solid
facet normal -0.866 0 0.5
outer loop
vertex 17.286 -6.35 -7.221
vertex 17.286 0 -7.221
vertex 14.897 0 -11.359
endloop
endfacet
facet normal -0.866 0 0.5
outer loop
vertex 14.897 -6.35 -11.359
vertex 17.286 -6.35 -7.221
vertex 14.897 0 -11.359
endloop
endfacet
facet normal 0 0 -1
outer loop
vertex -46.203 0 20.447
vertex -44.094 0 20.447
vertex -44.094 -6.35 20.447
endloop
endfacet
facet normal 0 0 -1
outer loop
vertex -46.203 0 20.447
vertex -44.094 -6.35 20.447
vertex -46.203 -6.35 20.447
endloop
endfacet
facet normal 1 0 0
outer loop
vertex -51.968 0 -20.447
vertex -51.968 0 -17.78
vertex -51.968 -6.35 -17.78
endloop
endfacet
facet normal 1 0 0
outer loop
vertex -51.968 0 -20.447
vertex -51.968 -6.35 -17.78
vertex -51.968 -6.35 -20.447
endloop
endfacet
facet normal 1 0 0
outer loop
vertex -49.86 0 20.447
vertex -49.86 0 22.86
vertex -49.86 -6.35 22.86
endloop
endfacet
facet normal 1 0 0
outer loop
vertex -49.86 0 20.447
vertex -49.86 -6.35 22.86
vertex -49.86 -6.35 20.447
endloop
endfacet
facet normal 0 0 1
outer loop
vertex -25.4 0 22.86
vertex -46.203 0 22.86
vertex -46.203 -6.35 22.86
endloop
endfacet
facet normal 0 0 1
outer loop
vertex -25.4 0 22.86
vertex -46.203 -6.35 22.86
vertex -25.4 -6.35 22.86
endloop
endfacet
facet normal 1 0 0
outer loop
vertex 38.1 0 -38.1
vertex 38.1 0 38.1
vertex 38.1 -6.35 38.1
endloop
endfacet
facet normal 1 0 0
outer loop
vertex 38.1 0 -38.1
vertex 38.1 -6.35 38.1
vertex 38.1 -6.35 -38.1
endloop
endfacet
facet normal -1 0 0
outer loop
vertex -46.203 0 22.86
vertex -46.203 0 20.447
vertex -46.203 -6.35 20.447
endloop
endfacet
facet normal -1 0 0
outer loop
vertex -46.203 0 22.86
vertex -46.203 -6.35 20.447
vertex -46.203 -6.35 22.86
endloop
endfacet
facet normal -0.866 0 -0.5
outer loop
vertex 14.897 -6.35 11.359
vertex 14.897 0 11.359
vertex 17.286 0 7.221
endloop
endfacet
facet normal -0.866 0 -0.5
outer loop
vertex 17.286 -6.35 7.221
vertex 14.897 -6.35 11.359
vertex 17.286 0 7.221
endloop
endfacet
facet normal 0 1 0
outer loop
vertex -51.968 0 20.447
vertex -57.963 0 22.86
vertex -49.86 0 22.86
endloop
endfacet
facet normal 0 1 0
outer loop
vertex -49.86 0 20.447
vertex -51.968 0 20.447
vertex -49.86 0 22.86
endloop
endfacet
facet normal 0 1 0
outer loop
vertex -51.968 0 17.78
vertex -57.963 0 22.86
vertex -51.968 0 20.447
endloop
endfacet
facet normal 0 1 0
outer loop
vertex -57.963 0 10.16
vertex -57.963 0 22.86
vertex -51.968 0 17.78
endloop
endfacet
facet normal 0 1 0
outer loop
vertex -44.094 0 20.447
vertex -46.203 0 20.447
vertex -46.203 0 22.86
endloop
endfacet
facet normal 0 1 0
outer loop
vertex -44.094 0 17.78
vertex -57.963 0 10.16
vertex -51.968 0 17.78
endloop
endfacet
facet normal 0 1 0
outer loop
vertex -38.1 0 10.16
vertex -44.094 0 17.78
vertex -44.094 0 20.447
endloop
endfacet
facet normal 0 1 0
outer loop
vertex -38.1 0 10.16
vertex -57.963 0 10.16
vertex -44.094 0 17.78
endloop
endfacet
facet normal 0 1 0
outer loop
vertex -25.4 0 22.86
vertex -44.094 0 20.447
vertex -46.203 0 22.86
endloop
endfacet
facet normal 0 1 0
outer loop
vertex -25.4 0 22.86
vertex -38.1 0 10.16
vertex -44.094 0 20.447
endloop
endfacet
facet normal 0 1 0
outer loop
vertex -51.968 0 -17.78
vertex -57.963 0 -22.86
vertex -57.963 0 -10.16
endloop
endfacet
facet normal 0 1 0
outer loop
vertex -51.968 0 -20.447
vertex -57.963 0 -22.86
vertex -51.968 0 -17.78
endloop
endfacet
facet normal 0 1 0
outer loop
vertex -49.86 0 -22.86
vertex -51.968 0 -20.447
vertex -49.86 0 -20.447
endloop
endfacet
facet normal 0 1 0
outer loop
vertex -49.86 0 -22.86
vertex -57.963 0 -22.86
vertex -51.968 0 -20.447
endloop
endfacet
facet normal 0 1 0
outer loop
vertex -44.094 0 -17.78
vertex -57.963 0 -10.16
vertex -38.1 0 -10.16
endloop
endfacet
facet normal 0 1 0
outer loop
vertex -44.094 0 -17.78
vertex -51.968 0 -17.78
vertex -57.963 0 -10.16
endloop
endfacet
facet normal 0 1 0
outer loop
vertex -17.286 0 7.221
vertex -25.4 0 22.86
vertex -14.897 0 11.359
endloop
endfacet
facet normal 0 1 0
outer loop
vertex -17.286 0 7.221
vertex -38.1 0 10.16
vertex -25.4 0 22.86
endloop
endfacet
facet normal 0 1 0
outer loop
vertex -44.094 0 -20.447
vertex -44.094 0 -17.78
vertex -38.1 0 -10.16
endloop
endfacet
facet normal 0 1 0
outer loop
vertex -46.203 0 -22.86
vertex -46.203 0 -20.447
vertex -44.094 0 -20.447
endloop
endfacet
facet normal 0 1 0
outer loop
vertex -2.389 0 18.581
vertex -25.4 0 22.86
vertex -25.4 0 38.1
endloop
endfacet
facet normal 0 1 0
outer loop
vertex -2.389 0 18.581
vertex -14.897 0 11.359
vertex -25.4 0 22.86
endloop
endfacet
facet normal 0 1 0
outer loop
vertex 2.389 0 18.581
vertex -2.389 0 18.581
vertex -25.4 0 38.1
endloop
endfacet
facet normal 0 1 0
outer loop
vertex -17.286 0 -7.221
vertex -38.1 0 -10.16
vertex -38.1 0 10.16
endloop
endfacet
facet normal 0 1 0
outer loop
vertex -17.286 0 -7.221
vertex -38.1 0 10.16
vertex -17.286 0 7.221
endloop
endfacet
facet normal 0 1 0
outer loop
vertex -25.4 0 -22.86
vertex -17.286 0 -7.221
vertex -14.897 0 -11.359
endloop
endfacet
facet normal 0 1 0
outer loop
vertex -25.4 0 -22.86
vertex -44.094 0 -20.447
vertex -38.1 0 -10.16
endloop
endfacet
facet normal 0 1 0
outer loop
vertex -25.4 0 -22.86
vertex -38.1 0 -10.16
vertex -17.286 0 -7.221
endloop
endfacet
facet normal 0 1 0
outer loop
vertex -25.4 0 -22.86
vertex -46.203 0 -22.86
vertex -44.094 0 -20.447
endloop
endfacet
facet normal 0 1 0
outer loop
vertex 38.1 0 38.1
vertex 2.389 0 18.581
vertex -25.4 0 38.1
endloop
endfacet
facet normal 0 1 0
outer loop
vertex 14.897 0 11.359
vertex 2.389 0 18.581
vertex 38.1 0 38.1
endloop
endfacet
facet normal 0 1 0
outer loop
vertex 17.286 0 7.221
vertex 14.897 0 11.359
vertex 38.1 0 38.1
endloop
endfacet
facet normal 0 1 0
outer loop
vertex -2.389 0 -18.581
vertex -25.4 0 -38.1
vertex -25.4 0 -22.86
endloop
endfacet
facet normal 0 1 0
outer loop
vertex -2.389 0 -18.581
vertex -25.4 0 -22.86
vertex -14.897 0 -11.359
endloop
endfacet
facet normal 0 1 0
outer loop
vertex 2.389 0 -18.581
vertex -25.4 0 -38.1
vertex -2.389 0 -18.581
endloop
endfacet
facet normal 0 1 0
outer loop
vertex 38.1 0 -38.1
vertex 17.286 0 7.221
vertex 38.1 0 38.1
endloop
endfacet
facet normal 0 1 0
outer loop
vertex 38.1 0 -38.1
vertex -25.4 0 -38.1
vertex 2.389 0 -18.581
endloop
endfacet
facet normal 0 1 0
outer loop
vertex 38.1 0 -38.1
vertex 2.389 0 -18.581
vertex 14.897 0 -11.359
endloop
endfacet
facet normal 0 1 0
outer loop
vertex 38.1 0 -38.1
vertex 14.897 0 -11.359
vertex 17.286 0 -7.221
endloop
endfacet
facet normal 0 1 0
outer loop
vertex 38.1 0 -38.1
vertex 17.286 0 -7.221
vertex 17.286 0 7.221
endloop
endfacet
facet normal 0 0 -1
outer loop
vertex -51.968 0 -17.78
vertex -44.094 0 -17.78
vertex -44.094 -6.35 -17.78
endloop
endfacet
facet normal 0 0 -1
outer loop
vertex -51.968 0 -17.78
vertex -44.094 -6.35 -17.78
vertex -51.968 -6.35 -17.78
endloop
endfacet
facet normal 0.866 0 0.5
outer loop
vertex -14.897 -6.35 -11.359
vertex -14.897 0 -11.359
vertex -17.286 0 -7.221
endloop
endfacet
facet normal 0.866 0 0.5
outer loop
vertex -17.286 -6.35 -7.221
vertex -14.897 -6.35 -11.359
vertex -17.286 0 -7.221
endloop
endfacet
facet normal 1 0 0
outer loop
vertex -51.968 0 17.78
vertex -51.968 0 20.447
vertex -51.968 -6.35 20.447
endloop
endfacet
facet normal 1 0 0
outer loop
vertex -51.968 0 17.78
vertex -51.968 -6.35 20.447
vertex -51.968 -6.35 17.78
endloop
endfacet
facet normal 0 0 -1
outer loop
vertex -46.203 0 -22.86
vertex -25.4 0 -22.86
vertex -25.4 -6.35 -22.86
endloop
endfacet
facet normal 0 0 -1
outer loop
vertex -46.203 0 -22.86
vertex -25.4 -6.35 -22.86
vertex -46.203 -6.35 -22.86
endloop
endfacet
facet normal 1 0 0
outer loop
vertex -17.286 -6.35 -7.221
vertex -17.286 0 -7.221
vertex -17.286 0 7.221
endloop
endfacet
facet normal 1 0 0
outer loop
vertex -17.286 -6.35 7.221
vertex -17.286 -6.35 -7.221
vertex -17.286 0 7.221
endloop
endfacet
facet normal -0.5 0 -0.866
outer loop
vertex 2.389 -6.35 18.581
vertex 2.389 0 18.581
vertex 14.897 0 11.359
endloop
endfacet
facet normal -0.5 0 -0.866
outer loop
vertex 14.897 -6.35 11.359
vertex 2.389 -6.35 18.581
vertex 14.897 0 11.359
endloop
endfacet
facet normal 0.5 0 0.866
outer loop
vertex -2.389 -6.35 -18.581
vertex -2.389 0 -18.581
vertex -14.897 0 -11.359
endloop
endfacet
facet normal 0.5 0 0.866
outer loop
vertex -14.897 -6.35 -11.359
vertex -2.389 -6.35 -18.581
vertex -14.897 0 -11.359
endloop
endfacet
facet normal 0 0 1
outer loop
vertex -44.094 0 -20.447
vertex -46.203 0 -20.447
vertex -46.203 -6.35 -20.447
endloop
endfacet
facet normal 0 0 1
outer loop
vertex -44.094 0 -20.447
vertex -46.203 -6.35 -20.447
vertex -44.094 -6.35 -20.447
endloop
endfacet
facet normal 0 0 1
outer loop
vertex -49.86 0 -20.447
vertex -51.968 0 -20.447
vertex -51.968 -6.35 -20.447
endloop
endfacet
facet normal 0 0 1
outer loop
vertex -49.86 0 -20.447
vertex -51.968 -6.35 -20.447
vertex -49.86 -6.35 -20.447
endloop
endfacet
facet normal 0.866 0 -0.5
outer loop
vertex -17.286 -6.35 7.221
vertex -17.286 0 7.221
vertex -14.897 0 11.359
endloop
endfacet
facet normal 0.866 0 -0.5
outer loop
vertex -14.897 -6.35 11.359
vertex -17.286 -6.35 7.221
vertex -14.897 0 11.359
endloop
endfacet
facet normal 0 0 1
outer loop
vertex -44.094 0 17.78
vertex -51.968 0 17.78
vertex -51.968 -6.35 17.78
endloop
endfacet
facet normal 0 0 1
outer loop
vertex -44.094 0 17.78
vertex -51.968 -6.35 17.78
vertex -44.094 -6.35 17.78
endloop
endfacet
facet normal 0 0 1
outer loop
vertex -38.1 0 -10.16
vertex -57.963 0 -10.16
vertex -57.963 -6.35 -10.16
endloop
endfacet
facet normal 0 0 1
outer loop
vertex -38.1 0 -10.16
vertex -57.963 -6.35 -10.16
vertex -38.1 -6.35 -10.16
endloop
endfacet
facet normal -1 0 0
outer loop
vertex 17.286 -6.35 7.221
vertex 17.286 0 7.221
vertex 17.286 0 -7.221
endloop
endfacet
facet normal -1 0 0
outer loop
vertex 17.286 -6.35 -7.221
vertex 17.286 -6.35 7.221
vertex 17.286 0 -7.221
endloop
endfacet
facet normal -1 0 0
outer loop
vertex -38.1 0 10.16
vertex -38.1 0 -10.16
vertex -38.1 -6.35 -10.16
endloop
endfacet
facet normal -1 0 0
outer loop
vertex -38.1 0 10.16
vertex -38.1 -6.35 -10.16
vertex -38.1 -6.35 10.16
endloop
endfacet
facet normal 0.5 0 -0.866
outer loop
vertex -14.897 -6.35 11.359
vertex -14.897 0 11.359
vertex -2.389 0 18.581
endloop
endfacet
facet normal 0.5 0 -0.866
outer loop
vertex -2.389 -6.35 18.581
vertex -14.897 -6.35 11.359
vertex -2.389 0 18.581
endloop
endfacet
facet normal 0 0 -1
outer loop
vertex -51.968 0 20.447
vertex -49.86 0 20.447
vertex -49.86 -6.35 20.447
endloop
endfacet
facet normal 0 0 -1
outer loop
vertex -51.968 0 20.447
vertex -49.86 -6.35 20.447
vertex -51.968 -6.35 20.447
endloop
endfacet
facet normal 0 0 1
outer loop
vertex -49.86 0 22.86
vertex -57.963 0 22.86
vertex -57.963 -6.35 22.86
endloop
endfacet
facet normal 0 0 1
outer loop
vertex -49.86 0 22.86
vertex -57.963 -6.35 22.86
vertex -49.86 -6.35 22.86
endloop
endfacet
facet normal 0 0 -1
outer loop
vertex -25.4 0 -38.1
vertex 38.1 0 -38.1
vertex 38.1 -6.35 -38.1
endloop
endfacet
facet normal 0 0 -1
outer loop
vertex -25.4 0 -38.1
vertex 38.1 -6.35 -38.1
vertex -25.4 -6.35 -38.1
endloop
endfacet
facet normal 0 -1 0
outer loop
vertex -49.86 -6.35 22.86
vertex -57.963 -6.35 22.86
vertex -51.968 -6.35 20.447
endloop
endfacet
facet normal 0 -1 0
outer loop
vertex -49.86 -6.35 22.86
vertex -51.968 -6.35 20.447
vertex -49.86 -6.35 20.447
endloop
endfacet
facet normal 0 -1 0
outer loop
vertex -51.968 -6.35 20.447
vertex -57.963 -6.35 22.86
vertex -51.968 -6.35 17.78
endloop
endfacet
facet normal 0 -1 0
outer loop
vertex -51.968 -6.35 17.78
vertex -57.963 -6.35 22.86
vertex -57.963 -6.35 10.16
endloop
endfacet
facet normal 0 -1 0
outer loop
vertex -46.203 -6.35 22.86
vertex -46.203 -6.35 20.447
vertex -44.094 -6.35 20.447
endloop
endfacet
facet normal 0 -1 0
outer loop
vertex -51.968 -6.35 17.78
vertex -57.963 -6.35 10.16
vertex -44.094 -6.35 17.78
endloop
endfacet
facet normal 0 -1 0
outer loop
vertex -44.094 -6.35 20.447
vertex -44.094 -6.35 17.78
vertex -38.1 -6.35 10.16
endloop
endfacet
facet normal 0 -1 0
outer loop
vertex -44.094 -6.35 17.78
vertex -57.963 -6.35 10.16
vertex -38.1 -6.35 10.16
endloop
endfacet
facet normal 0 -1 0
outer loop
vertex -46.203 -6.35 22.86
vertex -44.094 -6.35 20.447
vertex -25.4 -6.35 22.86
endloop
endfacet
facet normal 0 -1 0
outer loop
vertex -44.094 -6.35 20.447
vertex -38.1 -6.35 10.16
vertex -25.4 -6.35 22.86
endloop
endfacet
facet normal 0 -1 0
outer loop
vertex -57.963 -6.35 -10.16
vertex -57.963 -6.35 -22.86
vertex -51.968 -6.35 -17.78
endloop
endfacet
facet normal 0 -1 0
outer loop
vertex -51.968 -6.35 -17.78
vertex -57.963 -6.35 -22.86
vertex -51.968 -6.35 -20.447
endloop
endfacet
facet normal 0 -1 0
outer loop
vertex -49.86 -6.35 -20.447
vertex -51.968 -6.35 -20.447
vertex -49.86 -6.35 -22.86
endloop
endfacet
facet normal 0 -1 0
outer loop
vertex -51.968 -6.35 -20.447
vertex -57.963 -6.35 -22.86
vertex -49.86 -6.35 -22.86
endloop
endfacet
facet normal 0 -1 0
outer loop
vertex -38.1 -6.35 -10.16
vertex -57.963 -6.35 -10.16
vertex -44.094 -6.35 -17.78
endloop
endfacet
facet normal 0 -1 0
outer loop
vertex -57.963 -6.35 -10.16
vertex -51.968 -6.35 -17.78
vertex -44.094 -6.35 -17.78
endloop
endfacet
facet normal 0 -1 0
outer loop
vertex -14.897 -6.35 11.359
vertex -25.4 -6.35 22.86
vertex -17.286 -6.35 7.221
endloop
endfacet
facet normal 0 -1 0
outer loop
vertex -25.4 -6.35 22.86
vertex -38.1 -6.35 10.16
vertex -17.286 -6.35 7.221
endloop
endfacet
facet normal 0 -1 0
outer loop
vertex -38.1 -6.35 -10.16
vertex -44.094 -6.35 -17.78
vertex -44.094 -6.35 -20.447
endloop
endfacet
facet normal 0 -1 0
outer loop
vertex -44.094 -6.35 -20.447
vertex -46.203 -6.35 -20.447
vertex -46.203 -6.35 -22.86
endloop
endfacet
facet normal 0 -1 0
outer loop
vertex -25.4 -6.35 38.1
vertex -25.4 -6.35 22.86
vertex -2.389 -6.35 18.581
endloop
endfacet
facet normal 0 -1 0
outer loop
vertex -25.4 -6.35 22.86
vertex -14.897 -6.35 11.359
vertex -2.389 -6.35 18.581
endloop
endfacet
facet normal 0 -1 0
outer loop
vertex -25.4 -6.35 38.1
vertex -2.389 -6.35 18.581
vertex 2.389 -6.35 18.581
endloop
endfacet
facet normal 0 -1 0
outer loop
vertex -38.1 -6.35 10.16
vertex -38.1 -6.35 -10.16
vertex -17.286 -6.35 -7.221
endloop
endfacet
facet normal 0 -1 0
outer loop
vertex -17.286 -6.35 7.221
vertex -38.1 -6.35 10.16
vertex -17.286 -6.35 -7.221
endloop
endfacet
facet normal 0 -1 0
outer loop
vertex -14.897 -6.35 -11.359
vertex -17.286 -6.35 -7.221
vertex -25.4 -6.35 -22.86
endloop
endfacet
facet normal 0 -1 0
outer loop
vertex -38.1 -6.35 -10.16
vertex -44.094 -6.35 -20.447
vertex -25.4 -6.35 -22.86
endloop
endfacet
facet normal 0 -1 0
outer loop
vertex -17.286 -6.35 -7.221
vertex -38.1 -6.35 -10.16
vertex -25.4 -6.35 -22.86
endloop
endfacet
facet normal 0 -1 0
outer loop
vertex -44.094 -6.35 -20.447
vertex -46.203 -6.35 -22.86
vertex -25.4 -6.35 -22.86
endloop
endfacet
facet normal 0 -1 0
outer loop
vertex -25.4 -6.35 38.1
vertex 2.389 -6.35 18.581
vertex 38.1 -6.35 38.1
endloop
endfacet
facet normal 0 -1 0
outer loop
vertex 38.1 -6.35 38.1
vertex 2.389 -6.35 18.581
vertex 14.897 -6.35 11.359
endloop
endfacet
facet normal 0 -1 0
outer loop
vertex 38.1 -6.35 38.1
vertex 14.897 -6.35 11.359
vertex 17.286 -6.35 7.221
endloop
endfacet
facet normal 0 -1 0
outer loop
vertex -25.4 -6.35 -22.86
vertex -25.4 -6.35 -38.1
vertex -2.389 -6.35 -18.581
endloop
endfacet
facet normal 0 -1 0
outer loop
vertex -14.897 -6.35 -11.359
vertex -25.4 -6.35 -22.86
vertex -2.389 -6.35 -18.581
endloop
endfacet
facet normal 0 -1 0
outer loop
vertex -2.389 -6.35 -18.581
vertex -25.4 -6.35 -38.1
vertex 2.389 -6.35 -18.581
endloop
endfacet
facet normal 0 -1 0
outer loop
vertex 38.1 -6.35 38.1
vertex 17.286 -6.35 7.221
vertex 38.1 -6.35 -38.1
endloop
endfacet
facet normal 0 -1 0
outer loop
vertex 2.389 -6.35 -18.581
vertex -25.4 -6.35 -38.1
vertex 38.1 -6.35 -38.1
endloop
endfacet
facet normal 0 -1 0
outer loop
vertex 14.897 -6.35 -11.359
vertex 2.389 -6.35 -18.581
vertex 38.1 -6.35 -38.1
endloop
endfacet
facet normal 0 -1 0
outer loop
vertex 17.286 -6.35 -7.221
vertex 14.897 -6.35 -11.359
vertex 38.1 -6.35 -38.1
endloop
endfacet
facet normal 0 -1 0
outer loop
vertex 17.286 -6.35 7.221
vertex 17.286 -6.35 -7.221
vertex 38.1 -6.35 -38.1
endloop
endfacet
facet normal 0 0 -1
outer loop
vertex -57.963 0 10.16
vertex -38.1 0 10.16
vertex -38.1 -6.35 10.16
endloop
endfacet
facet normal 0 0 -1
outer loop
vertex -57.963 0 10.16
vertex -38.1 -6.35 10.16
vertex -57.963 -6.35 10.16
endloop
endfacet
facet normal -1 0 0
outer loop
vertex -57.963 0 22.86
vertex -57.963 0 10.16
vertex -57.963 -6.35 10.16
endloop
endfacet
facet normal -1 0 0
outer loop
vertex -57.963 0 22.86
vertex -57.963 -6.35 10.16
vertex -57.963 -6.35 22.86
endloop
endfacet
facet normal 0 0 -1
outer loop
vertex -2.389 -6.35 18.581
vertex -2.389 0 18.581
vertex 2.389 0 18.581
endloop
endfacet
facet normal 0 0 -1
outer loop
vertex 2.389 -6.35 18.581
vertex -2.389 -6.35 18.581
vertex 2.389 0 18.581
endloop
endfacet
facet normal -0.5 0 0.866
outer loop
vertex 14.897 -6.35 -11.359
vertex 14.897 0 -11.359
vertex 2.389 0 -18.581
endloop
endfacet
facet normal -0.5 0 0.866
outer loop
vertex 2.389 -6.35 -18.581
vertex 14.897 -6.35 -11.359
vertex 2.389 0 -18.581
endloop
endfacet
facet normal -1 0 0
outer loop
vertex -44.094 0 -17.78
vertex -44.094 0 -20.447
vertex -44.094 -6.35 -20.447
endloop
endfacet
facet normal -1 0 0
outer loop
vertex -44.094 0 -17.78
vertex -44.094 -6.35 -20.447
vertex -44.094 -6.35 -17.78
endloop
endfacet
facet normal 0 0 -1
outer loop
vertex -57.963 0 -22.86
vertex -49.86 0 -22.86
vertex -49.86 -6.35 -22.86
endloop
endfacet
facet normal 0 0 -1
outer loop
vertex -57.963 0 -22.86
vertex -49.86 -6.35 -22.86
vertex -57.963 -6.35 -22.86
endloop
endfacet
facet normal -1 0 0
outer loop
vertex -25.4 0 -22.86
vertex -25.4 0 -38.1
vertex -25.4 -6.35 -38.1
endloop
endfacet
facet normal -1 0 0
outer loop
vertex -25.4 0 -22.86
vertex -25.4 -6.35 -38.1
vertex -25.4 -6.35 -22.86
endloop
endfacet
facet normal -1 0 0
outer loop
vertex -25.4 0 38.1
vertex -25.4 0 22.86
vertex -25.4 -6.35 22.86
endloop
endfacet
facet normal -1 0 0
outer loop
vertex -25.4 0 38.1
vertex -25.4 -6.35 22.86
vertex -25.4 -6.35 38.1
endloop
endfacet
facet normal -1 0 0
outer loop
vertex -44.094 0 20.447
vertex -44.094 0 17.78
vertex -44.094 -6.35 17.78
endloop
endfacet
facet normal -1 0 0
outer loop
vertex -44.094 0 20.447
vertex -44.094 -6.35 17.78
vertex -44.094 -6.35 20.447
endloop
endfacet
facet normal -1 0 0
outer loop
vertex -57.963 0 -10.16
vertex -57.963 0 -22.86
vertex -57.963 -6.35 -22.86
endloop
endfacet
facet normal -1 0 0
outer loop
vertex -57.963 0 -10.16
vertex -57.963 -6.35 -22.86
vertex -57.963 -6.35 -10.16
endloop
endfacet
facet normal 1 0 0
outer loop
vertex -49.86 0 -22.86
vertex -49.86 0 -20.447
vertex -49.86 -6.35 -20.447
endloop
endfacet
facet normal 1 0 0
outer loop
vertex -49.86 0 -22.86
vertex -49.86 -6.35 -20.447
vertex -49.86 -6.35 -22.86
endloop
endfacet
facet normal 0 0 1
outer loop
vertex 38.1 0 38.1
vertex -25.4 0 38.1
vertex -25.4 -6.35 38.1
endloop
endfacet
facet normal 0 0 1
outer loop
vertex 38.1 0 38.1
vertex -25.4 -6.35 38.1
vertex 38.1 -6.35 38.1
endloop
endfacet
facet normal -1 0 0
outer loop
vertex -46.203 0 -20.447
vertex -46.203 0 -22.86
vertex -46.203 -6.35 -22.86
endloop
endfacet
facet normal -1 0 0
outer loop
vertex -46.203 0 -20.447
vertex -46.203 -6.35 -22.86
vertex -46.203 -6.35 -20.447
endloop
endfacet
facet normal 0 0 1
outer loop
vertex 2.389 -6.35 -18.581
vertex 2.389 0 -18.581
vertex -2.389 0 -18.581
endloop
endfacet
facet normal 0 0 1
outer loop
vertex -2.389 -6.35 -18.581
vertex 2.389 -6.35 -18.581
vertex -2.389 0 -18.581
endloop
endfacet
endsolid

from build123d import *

# Parameters (mm, degrees)
BOSS_EXTRUDE1_DEPTH = 6.35


with BuildPart() as part:
    # Sketch1 → Boss-Extrude1 (new body)
    with BuildSketch(Plane(origin=(0, 0, 0), x_dir=(1, 0, 0), z_dir=(0, 1, 0))):
        Polygon((-25.4, -38.1), (38.1, -38.1), (38.1, 38.1), (-25.4, 38.1), (-25.4, 22.86), (-38.1, 22.86), (-46.2026, 22.86), (-46.2026, 20.447), (-44.0944, 20.447), (-44.0944, 17.78), (-51.9684, 17.78), (-51.9684, 20.447), (-49.8602, 20.447), (-49.8602, 22.86), (-57.9628, 22.86), (-57.9628, 10.16), (-38.1, 10.16), (-38.1, -10.16), (-57.9628, -10.16), (-57.9628, -22.86), (-49.8602, -22.86), (-49.8602, -20.447), (-51.9684, -20.447), (-51.9684, -17.78), (-44.0944, -17.78), (-44.0944, -20.447), (-46.2026, -20.447), (-46.2026, -22.86), (-38.1, -22.86), (-25.4, -22.86), align=None)
        Polygon((-2.389310714, -18.580574179), (2.389310714, -18.580574179), (14.896593899, -11.359490865), (17.285904613, -7.221083314), (17.285904613, 7.221083314), (14.896593899, 11.359490865), (2.389310714, 18.580574179), (-2.389310714, 18.580574179), (-14.896593899, 11.359490865), (-17.285904613, 7.221083314), (-17.285904613, -7.221083314), (-14.896593899, -11.359490865), align=None, mode=Mode.SUBTRACT)
    extrude(amount=-BOSS_EXTRUDE1_DEPTH)


solid = part.part
